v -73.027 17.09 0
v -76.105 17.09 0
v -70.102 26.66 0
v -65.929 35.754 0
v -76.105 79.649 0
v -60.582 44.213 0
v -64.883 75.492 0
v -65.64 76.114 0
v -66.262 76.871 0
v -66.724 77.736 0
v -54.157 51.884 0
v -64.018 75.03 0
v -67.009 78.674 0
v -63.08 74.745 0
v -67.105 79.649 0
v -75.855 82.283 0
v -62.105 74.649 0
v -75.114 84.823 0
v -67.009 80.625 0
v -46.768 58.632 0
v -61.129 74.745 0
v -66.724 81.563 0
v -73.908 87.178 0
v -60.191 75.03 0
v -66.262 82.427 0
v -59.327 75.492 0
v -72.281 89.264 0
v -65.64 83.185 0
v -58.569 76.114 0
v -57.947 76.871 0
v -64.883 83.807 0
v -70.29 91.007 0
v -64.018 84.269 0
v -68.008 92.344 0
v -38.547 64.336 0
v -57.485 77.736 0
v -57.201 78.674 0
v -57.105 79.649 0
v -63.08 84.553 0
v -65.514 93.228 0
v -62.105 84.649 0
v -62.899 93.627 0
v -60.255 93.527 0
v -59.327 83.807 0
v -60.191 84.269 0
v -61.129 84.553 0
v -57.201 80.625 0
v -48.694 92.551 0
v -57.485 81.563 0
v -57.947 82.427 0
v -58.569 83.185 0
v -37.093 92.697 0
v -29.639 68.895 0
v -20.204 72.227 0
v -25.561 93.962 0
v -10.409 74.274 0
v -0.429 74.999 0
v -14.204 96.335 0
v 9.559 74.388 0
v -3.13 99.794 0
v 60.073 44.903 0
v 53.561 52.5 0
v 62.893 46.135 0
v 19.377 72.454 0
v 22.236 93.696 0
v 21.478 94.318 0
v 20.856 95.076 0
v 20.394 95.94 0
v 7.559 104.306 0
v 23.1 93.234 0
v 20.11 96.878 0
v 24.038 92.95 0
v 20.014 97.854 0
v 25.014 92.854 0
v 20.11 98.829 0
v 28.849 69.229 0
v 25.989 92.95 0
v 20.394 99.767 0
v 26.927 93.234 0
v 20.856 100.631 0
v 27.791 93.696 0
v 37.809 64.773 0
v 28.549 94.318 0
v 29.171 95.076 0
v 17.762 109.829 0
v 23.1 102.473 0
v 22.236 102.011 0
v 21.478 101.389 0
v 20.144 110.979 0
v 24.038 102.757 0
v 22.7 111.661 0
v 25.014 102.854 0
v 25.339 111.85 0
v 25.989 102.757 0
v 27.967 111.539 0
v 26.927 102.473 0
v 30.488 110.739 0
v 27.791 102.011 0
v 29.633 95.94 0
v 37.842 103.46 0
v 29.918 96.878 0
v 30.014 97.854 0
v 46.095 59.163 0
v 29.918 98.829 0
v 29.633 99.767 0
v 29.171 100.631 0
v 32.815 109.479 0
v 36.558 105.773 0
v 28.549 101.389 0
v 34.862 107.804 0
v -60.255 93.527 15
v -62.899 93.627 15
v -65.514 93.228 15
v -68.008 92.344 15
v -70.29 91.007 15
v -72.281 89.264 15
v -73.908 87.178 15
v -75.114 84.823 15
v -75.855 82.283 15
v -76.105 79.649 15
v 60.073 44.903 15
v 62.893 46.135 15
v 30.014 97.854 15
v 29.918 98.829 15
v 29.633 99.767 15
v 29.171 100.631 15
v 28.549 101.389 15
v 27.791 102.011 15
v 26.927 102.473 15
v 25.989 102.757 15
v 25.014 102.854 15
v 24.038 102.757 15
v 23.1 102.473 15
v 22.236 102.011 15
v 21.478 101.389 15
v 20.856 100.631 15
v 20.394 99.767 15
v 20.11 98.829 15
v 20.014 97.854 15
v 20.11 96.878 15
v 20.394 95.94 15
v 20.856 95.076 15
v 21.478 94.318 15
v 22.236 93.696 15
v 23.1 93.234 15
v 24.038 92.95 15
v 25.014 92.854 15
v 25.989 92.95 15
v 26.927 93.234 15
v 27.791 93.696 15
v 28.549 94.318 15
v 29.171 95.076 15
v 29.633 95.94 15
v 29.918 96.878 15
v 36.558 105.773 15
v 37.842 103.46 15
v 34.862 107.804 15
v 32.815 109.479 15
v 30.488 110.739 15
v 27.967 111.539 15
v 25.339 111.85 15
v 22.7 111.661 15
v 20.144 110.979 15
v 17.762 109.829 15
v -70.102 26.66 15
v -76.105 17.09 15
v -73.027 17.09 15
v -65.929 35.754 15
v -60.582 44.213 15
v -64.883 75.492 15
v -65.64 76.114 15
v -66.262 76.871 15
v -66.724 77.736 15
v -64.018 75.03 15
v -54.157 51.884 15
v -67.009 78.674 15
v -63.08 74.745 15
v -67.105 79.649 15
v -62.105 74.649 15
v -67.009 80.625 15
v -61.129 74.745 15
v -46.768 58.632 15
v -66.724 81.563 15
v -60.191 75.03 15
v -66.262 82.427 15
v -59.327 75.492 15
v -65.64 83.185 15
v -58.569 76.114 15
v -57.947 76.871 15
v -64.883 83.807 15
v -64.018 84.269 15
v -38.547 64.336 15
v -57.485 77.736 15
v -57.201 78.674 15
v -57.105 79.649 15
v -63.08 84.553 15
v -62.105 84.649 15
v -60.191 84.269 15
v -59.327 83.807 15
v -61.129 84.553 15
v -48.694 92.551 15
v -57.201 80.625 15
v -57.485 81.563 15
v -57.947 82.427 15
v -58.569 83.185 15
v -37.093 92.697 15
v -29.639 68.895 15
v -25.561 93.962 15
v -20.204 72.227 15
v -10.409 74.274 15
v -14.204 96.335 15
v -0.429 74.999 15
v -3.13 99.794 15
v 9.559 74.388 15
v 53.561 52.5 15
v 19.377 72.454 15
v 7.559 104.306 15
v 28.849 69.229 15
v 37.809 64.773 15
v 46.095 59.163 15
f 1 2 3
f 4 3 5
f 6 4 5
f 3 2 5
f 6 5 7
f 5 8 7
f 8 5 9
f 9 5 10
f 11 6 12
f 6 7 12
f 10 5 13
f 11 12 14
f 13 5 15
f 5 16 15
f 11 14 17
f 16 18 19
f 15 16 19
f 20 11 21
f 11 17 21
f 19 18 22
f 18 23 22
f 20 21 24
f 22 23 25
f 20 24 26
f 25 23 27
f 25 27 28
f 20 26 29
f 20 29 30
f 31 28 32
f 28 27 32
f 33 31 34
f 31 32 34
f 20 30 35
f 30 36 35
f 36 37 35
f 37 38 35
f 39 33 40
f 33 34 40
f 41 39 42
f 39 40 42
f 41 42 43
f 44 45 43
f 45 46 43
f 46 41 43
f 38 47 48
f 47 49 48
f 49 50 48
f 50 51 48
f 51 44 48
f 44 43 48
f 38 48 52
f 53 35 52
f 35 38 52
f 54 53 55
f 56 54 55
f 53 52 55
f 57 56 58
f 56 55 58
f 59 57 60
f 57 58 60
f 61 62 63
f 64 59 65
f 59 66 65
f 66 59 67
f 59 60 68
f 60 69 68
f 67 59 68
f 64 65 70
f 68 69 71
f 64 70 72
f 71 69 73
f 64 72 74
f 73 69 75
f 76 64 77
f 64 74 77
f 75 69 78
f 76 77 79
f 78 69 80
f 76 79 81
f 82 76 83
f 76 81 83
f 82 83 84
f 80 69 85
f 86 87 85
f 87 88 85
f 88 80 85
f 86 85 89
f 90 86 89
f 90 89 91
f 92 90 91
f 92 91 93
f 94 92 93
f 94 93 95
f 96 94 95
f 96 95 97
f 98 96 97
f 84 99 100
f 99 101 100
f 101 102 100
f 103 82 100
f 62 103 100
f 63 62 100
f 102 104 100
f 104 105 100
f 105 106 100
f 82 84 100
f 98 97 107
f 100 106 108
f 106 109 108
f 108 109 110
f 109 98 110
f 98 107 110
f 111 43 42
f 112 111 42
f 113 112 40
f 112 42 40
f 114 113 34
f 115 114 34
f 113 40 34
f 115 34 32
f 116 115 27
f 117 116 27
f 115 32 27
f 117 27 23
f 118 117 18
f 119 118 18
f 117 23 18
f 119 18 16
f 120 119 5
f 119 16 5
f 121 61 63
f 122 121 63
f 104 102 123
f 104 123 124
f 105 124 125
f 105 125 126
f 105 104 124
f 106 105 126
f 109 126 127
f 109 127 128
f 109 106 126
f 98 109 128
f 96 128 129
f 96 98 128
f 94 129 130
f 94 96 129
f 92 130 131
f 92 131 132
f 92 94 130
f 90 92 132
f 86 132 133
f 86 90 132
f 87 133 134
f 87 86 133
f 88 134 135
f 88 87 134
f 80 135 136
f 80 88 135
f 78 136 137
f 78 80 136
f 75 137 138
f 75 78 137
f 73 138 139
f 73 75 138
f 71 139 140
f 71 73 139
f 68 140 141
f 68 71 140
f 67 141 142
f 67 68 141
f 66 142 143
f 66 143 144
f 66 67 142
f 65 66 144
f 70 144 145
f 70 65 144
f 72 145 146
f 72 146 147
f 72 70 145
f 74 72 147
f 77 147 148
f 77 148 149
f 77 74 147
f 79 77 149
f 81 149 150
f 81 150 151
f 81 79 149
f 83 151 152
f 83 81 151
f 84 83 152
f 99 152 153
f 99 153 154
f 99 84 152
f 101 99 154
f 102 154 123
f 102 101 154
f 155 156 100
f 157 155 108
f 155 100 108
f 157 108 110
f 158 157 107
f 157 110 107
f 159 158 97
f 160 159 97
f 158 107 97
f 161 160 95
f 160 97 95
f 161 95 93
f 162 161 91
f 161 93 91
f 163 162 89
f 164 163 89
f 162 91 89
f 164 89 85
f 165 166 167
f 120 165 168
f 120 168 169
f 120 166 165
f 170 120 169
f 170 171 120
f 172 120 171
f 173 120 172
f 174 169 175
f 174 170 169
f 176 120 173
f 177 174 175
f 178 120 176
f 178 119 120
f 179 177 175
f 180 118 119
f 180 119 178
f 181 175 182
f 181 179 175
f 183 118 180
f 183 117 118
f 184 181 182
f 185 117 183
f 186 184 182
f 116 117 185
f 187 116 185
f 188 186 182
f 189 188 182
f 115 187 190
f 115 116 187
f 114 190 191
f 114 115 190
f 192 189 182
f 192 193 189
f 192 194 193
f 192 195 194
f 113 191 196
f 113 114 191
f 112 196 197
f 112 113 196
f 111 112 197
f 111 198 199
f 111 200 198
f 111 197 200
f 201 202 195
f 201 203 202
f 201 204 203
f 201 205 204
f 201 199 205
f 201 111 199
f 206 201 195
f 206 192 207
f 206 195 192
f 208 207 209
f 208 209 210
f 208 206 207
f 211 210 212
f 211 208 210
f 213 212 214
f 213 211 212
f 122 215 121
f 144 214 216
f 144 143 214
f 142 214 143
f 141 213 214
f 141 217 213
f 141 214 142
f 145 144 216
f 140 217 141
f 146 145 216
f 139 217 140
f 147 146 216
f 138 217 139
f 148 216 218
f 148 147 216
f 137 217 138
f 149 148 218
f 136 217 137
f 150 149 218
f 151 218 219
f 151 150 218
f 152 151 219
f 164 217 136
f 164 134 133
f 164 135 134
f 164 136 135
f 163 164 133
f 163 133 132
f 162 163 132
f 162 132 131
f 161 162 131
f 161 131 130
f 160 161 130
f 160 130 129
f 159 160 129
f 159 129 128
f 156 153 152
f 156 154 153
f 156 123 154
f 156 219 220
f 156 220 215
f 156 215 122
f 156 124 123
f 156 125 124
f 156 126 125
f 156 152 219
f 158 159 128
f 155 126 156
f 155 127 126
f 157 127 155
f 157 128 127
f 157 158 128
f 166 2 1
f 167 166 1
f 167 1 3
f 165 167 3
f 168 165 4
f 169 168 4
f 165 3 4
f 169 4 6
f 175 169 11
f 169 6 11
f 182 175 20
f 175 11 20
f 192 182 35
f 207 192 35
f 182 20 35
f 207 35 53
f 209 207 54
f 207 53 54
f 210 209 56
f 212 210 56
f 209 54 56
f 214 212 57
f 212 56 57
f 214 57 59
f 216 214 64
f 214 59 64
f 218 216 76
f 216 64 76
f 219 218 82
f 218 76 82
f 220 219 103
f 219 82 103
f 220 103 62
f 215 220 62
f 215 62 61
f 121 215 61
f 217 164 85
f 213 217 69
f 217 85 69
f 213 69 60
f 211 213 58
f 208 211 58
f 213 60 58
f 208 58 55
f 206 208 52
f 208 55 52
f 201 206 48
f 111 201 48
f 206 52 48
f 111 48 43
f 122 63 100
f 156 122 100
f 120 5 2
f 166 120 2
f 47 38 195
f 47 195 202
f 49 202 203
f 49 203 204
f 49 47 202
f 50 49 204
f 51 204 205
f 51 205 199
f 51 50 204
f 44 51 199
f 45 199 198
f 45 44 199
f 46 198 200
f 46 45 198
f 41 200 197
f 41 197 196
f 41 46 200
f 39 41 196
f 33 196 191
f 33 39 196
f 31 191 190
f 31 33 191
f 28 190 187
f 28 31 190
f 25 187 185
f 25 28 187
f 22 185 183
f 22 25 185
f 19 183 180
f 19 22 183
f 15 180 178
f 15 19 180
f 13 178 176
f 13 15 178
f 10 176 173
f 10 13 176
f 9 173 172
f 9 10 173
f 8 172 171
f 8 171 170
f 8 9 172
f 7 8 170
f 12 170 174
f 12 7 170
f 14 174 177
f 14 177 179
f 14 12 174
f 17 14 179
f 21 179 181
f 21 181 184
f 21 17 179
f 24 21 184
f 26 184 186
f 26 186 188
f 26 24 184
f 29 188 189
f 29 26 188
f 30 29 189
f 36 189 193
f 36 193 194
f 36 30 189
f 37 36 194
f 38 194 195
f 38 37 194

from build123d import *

# Parameters (mm, degrees)
F0_R     = 5
F1_DEPTH = 15


with BuildPart() as f1:
    # F0 (on Top) → F1 (new body)
    with BuildSketch(Plane.XY):
        with BuildLine():
            ThreePointArc((-73.026882, 17.090189), (-15.34069, 73.414326), (60.072808, 44.902758))
            Line((60.072808, 44.902758), (62.89309, 46.135228))
            Line((62.89309, 46.135228), (37.842179, 103.459659))
            ThreePointArc((37.842179, 103.459659), (29.246367, 111.198365), (17.761595, 109.82886))
            ThreePointArc((17.761595, 109.82886), (-19.853627, 95.011416), (-60.254823, 93.526516))
            ThreePointArc((-60.254823, 93.526516), (-71.327003, 90.18251), (-76.104701, 79.64927))
            Line((-76.104701, 79.64927), (-76.104701, 17.090189))
            Line((-76.104701, 17.090189), (-73.026882, 17.090189))
        make_face()
        with Locations((-62.104701, 79.64927)):
            Circle(F0_R, mode=Mode.SUBTRACT)
        with Locations((25.013633, 97.853555)):
            Circle(F0_R, mode=Mode.SUBTRACT)
    extrude(amount=F1_DEPTH)


solid = f1.part
